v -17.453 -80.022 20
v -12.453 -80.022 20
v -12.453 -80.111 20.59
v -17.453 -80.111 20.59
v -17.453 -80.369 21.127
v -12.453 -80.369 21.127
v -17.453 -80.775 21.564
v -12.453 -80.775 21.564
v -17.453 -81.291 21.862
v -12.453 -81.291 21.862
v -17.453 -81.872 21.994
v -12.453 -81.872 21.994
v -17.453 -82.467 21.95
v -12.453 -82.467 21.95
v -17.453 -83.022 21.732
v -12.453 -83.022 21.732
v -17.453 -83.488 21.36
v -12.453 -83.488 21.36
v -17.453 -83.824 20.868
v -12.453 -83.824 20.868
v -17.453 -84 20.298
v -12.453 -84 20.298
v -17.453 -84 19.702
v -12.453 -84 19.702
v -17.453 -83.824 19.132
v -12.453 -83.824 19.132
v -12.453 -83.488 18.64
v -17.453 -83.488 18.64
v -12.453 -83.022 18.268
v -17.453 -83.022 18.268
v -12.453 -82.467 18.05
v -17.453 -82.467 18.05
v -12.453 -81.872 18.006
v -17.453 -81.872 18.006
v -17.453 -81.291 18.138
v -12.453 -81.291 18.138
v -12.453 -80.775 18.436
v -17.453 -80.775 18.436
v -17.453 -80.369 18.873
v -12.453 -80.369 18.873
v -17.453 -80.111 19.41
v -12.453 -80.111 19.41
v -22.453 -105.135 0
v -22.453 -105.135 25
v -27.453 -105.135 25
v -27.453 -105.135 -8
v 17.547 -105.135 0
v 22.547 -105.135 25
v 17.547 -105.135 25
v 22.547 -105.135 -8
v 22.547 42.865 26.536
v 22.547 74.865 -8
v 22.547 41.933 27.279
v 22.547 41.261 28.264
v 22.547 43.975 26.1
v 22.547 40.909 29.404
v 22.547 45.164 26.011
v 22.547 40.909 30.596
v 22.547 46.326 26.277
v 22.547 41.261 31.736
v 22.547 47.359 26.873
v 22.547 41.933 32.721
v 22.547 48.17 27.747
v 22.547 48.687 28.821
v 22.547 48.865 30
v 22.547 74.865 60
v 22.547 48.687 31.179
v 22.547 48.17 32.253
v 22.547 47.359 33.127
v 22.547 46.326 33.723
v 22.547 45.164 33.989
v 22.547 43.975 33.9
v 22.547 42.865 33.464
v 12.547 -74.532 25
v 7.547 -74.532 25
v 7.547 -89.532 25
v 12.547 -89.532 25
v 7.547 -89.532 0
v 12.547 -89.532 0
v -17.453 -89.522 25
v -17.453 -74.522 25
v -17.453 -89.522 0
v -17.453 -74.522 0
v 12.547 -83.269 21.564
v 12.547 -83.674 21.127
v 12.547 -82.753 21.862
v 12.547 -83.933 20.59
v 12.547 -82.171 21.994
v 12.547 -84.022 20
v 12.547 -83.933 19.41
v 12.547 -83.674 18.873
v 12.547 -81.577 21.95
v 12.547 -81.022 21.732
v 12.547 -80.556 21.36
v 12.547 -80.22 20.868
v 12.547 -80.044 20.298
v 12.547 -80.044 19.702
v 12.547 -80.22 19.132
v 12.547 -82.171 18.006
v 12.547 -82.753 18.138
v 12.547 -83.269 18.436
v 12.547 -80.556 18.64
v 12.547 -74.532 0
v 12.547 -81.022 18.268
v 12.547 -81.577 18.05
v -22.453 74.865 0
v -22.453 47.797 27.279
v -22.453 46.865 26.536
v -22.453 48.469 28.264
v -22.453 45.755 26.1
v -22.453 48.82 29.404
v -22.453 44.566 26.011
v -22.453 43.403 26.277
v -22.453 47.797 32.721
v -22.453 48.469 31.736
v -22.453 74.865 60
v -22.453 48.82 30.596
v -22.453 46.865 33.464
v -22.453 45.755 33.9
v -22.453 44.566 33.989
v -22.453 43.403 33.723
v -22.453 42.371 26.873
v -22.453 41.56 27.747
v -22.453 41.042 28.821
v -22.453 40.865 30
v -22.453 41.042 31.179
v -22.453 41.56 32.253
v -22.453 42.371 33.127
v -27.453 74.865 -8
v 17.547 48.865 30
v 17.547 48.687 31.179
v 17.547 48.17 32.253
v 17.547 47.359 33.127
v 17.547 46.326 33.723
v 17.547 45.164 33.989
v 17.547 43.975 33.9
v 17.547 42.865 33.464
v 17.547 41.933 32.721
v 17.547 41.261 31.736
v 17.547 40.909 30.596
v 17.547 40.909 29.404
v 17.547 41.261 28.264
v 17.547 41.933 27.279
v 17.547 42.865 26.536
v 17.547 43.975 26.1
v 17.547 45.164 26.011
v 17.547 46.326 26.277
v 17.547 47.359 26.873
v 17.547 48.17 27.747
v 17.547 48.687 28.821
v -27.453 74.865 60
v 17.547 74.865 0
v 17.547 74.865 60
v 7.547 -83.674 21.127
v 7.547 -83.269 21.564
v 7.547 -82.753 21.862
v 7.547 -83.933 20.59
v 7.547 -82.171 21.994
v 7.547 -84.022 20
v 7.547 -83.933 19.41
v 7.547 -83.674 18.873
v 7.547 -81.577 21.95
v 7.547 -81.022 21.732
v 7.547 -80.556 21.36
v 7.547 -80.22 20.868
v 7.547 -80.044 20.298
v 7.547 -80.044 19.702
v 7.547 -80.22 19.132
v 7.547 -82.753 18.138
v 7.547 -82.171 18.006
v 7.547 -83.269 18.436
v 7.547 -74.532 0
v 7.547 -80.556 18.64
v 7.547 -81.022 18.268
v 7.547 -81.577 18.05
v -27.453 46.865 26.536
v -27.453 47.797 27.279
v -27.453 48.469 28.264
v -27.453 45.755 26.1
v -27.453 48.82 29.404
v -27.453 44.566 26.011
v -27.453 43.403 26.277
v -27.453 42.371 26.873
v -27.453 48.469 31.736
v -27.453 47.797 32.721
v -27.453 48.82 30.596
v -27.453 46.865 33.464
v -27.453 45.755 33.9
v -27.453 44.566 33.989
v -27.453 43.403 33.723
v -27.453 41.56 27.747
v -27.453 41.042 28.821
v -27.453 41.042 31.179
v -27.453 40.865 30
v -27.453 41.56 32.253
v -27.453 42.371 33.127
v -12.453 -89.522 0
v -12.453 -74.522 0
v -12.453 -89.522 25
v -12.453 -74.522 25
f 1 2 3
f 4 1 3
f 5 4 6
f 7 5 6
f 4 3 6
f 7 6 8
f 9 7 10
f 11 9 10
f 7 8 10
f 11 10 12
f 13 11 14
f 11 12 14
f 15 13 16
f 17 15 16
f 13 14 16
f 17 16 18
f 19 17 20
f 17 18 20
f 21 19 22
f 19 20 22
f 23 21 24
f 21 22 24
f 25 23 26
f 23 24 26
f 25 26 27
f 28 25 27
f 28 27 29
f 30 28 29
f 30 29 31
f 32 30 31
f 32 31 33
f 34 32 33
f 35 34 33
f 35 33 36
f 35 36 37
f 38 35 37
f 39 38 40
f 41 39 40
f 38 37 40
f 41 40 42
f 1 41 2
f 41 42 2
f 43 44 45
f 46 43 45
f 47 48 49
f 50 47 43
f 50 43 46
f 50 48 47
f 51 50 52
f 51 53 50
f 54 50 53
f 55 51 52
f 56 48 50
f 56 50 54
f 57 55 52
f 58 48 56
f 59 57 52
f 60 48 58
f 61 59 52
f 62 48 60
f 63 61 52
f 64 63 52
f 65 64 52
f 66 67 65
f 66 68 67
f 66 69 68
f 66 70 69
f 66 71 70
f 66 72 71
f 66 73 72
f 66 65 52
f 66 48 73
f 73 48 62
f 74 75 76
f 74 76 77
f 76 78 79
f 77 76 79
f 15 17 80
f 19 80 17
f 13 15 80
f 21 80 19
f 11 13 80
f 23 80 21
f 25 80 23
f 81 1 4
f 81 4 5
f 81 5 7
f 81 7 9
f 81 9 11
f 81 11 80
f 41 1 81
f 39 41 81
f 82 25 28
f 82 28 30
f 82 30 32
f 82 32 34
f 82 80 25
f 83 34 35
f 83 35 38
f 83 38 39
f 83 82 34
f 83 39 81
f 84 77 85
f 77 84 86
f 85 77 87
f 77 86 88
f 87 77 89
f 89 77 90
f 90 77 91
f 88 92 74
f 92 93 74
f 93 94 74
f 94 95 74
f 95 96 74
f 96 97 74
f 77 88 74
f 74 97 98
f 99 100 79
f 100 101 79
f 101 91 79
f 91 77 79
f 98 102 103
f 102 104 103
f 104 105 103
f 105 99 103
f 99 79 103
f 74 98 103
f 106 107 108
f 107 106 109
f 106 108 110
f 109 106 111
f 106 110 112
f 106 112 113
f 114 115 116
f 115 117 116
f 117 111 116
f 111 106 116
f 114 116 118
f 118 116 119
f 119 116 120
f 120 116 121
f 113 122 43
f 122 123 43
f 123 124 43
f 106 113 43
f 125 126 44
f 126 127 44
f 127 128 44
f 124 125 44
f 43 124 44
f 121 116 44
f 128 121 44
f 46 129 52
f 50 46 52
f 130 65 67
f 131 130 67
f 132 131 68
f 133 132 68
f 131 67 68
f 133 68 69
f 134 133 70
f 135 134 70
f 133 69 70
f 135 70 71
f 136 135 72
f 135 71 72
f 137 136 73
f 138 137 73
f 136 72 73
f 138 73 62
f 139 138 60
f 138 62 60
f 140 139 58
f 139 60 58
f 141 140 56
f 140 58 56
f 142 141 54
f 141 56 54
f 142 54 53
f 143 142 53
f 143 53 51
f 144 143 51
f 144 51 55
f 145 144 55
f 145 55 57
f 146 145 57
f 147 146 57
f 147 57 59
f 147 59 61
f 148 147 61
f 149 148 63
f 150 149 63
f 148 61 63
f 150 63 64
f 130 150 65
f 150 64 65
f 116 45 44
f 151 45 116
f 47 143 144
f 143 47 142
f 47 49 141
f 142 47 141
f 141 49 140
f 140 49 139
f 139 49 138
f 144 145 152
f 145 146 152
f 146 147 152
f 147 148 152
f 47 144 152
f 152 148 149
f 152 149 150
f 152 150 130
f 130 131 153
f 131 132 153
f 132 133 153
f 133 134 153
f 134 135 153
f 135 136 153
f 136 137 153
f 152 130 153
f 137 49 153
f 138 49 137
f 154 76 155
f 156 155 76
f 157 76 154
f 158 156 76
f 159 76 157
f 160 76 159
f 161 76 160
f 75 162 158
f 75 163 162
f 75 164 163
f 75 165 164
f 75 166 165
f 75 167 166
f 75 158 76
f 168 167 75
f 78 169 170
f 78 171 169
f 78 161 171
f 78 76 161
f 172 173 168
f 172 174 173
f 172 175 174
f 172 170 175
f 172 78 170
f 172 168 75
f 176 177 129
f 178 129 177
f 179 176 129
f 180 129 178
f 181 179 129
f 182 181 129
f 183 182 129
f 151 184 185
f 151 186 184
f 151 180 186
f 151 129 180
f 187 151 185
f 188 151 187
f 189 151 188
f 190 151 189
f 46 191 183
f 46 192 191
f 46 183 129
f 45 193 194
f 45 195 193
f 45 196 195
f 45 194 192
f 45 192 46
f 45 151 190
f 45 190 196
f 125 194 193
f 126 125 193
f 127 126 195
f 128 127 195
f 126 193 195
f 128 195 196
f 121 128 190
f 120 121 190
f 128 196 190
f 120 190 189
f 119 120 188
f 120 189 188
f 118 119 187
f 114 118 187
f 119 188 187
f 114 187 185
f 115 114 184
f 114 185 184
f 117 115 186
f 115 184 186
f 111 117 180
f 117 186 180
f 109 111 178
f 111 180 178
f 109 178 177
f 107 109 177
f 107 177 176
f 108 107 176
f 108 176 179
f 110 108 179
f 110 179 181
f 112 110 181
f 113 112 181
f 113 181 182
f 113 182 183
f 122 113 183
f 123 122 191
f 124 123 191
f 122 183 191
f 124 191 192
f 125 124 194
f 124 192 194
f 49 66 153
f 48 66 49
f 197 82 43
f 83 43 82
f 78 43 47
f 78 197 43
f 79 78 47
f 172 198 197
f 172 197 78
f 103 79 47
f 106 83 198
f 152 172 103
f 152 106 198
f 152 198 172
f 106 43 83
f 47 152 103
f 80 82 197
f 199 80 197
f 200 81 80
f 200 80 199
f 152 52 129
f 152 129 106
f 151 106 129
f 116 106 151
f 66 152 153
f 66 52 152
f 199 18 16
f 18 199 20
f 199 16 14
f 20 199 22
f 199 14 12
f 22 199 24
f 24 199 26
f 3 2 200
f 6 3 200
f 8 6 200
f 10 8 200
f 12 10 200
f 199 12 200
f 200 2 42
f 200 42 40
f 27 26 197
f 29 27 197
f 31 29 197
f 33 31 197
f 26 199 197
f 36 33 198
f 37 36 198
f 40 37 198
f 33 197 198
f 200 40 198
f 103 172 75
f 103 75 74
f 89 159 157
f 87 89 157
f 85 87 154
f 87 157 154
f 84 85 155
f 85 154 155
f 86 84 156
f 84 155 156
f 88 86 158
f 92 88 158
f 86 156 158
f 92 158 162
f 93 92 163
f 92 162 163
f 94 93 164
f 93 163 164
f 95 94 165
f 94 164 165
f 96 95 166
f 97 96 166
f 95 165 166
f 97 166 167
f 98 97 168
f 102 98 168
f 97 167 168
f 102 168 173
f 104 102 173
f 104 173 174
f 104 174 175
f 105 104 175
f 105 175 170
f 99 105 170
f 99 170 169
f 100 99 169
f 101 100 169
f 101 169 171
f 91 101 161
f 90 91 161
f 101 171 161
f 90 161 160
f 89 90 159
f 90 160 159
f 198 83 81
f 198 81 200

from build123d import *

# Parameters (mm, degrees)
F0_W      = 50
F0_H      = 180
F1_DEPTH  = 8
F2_R      = 4
F3_DEPTH  = 5
F4_R      = 4
F5_DEPTH  = 5
F6_W      = 5
F6_H      = 15
F7_DEPTH  = 25
F8_R      = 2
F9_DEPTH  = 5
F10_R     = 2
F11_DEPTH = 5


with BuildPart() as f1:
    # F0 (on Top) → F1 (new body)
    with BuildSketch(Plane.XY):
        with Locations((-2.453425, -15.13525)):
            Rectangle(F0_W, F0_H)
    extrude(amount=-F1_DEPTH)

    # F2 (on face) → F3 (join)
    with BuildSketch(Plane(origin=(-27.453425, 0, 0), x_dir=(0, -1, 0), z_dir=(-1, 0, 0))):
        Polygon((-74.86475, 60), (-74.86475, 0), (105.13525, 0), (105.13525, 25), align=None)
        with Locations((-44.86475, 30)):
            Circle(F2_R, mode=Mode.SUBTRACT)
    extrude(amount=-F3_DEPTH)

    # F4 (on face) → F5 (join)
    with BuildSketch(Plane.YZ.offset(22.546575)):
        Polygon((-105.13525, 25), (-105.13525, 0), (74.86475, 0), (74.86475, 60), align=None)
        with Locations((44.86475, 30)):
            Circle(F4_R, mode=Mode.SUBTRACT)
    extrude(amount=-F5_DEPTH)

    # F6 (on face) → F7 (join)
    with BuildSketch(Plane.XY):
        with Locations((-14.953425, -82.021954)):
            Rectangle(F6_W, F6_H)
        with Locations((10.046575, -82.032483)):
            Rectangle(F6_W, F6_H)
    extrude(amount=F7_DEPTH)

    # F8 (on face) → F9 (cut)
    with BuildSketch(Plane.YZ.offset(-12.453425)):
        with Locations((-82.021954, 20)):
            Circle(F8_R)
    extrude(amount=-F9_DEPTH, mode=Mode.SUBTRACT)

    # F10 (on face) → F11 (cut)
    with BuildSketch(Plane(origin=(7.546575, 0, 0), x_dir=(0, -1, 0), z_dir=(-1, 0, 0))):
        with Locations((82.021954, 20)):
            Circle(F10_R)
    extrude(amount=-F11_DEPTH, mode=Mode.SUBTRACT)


solid = f1.part
